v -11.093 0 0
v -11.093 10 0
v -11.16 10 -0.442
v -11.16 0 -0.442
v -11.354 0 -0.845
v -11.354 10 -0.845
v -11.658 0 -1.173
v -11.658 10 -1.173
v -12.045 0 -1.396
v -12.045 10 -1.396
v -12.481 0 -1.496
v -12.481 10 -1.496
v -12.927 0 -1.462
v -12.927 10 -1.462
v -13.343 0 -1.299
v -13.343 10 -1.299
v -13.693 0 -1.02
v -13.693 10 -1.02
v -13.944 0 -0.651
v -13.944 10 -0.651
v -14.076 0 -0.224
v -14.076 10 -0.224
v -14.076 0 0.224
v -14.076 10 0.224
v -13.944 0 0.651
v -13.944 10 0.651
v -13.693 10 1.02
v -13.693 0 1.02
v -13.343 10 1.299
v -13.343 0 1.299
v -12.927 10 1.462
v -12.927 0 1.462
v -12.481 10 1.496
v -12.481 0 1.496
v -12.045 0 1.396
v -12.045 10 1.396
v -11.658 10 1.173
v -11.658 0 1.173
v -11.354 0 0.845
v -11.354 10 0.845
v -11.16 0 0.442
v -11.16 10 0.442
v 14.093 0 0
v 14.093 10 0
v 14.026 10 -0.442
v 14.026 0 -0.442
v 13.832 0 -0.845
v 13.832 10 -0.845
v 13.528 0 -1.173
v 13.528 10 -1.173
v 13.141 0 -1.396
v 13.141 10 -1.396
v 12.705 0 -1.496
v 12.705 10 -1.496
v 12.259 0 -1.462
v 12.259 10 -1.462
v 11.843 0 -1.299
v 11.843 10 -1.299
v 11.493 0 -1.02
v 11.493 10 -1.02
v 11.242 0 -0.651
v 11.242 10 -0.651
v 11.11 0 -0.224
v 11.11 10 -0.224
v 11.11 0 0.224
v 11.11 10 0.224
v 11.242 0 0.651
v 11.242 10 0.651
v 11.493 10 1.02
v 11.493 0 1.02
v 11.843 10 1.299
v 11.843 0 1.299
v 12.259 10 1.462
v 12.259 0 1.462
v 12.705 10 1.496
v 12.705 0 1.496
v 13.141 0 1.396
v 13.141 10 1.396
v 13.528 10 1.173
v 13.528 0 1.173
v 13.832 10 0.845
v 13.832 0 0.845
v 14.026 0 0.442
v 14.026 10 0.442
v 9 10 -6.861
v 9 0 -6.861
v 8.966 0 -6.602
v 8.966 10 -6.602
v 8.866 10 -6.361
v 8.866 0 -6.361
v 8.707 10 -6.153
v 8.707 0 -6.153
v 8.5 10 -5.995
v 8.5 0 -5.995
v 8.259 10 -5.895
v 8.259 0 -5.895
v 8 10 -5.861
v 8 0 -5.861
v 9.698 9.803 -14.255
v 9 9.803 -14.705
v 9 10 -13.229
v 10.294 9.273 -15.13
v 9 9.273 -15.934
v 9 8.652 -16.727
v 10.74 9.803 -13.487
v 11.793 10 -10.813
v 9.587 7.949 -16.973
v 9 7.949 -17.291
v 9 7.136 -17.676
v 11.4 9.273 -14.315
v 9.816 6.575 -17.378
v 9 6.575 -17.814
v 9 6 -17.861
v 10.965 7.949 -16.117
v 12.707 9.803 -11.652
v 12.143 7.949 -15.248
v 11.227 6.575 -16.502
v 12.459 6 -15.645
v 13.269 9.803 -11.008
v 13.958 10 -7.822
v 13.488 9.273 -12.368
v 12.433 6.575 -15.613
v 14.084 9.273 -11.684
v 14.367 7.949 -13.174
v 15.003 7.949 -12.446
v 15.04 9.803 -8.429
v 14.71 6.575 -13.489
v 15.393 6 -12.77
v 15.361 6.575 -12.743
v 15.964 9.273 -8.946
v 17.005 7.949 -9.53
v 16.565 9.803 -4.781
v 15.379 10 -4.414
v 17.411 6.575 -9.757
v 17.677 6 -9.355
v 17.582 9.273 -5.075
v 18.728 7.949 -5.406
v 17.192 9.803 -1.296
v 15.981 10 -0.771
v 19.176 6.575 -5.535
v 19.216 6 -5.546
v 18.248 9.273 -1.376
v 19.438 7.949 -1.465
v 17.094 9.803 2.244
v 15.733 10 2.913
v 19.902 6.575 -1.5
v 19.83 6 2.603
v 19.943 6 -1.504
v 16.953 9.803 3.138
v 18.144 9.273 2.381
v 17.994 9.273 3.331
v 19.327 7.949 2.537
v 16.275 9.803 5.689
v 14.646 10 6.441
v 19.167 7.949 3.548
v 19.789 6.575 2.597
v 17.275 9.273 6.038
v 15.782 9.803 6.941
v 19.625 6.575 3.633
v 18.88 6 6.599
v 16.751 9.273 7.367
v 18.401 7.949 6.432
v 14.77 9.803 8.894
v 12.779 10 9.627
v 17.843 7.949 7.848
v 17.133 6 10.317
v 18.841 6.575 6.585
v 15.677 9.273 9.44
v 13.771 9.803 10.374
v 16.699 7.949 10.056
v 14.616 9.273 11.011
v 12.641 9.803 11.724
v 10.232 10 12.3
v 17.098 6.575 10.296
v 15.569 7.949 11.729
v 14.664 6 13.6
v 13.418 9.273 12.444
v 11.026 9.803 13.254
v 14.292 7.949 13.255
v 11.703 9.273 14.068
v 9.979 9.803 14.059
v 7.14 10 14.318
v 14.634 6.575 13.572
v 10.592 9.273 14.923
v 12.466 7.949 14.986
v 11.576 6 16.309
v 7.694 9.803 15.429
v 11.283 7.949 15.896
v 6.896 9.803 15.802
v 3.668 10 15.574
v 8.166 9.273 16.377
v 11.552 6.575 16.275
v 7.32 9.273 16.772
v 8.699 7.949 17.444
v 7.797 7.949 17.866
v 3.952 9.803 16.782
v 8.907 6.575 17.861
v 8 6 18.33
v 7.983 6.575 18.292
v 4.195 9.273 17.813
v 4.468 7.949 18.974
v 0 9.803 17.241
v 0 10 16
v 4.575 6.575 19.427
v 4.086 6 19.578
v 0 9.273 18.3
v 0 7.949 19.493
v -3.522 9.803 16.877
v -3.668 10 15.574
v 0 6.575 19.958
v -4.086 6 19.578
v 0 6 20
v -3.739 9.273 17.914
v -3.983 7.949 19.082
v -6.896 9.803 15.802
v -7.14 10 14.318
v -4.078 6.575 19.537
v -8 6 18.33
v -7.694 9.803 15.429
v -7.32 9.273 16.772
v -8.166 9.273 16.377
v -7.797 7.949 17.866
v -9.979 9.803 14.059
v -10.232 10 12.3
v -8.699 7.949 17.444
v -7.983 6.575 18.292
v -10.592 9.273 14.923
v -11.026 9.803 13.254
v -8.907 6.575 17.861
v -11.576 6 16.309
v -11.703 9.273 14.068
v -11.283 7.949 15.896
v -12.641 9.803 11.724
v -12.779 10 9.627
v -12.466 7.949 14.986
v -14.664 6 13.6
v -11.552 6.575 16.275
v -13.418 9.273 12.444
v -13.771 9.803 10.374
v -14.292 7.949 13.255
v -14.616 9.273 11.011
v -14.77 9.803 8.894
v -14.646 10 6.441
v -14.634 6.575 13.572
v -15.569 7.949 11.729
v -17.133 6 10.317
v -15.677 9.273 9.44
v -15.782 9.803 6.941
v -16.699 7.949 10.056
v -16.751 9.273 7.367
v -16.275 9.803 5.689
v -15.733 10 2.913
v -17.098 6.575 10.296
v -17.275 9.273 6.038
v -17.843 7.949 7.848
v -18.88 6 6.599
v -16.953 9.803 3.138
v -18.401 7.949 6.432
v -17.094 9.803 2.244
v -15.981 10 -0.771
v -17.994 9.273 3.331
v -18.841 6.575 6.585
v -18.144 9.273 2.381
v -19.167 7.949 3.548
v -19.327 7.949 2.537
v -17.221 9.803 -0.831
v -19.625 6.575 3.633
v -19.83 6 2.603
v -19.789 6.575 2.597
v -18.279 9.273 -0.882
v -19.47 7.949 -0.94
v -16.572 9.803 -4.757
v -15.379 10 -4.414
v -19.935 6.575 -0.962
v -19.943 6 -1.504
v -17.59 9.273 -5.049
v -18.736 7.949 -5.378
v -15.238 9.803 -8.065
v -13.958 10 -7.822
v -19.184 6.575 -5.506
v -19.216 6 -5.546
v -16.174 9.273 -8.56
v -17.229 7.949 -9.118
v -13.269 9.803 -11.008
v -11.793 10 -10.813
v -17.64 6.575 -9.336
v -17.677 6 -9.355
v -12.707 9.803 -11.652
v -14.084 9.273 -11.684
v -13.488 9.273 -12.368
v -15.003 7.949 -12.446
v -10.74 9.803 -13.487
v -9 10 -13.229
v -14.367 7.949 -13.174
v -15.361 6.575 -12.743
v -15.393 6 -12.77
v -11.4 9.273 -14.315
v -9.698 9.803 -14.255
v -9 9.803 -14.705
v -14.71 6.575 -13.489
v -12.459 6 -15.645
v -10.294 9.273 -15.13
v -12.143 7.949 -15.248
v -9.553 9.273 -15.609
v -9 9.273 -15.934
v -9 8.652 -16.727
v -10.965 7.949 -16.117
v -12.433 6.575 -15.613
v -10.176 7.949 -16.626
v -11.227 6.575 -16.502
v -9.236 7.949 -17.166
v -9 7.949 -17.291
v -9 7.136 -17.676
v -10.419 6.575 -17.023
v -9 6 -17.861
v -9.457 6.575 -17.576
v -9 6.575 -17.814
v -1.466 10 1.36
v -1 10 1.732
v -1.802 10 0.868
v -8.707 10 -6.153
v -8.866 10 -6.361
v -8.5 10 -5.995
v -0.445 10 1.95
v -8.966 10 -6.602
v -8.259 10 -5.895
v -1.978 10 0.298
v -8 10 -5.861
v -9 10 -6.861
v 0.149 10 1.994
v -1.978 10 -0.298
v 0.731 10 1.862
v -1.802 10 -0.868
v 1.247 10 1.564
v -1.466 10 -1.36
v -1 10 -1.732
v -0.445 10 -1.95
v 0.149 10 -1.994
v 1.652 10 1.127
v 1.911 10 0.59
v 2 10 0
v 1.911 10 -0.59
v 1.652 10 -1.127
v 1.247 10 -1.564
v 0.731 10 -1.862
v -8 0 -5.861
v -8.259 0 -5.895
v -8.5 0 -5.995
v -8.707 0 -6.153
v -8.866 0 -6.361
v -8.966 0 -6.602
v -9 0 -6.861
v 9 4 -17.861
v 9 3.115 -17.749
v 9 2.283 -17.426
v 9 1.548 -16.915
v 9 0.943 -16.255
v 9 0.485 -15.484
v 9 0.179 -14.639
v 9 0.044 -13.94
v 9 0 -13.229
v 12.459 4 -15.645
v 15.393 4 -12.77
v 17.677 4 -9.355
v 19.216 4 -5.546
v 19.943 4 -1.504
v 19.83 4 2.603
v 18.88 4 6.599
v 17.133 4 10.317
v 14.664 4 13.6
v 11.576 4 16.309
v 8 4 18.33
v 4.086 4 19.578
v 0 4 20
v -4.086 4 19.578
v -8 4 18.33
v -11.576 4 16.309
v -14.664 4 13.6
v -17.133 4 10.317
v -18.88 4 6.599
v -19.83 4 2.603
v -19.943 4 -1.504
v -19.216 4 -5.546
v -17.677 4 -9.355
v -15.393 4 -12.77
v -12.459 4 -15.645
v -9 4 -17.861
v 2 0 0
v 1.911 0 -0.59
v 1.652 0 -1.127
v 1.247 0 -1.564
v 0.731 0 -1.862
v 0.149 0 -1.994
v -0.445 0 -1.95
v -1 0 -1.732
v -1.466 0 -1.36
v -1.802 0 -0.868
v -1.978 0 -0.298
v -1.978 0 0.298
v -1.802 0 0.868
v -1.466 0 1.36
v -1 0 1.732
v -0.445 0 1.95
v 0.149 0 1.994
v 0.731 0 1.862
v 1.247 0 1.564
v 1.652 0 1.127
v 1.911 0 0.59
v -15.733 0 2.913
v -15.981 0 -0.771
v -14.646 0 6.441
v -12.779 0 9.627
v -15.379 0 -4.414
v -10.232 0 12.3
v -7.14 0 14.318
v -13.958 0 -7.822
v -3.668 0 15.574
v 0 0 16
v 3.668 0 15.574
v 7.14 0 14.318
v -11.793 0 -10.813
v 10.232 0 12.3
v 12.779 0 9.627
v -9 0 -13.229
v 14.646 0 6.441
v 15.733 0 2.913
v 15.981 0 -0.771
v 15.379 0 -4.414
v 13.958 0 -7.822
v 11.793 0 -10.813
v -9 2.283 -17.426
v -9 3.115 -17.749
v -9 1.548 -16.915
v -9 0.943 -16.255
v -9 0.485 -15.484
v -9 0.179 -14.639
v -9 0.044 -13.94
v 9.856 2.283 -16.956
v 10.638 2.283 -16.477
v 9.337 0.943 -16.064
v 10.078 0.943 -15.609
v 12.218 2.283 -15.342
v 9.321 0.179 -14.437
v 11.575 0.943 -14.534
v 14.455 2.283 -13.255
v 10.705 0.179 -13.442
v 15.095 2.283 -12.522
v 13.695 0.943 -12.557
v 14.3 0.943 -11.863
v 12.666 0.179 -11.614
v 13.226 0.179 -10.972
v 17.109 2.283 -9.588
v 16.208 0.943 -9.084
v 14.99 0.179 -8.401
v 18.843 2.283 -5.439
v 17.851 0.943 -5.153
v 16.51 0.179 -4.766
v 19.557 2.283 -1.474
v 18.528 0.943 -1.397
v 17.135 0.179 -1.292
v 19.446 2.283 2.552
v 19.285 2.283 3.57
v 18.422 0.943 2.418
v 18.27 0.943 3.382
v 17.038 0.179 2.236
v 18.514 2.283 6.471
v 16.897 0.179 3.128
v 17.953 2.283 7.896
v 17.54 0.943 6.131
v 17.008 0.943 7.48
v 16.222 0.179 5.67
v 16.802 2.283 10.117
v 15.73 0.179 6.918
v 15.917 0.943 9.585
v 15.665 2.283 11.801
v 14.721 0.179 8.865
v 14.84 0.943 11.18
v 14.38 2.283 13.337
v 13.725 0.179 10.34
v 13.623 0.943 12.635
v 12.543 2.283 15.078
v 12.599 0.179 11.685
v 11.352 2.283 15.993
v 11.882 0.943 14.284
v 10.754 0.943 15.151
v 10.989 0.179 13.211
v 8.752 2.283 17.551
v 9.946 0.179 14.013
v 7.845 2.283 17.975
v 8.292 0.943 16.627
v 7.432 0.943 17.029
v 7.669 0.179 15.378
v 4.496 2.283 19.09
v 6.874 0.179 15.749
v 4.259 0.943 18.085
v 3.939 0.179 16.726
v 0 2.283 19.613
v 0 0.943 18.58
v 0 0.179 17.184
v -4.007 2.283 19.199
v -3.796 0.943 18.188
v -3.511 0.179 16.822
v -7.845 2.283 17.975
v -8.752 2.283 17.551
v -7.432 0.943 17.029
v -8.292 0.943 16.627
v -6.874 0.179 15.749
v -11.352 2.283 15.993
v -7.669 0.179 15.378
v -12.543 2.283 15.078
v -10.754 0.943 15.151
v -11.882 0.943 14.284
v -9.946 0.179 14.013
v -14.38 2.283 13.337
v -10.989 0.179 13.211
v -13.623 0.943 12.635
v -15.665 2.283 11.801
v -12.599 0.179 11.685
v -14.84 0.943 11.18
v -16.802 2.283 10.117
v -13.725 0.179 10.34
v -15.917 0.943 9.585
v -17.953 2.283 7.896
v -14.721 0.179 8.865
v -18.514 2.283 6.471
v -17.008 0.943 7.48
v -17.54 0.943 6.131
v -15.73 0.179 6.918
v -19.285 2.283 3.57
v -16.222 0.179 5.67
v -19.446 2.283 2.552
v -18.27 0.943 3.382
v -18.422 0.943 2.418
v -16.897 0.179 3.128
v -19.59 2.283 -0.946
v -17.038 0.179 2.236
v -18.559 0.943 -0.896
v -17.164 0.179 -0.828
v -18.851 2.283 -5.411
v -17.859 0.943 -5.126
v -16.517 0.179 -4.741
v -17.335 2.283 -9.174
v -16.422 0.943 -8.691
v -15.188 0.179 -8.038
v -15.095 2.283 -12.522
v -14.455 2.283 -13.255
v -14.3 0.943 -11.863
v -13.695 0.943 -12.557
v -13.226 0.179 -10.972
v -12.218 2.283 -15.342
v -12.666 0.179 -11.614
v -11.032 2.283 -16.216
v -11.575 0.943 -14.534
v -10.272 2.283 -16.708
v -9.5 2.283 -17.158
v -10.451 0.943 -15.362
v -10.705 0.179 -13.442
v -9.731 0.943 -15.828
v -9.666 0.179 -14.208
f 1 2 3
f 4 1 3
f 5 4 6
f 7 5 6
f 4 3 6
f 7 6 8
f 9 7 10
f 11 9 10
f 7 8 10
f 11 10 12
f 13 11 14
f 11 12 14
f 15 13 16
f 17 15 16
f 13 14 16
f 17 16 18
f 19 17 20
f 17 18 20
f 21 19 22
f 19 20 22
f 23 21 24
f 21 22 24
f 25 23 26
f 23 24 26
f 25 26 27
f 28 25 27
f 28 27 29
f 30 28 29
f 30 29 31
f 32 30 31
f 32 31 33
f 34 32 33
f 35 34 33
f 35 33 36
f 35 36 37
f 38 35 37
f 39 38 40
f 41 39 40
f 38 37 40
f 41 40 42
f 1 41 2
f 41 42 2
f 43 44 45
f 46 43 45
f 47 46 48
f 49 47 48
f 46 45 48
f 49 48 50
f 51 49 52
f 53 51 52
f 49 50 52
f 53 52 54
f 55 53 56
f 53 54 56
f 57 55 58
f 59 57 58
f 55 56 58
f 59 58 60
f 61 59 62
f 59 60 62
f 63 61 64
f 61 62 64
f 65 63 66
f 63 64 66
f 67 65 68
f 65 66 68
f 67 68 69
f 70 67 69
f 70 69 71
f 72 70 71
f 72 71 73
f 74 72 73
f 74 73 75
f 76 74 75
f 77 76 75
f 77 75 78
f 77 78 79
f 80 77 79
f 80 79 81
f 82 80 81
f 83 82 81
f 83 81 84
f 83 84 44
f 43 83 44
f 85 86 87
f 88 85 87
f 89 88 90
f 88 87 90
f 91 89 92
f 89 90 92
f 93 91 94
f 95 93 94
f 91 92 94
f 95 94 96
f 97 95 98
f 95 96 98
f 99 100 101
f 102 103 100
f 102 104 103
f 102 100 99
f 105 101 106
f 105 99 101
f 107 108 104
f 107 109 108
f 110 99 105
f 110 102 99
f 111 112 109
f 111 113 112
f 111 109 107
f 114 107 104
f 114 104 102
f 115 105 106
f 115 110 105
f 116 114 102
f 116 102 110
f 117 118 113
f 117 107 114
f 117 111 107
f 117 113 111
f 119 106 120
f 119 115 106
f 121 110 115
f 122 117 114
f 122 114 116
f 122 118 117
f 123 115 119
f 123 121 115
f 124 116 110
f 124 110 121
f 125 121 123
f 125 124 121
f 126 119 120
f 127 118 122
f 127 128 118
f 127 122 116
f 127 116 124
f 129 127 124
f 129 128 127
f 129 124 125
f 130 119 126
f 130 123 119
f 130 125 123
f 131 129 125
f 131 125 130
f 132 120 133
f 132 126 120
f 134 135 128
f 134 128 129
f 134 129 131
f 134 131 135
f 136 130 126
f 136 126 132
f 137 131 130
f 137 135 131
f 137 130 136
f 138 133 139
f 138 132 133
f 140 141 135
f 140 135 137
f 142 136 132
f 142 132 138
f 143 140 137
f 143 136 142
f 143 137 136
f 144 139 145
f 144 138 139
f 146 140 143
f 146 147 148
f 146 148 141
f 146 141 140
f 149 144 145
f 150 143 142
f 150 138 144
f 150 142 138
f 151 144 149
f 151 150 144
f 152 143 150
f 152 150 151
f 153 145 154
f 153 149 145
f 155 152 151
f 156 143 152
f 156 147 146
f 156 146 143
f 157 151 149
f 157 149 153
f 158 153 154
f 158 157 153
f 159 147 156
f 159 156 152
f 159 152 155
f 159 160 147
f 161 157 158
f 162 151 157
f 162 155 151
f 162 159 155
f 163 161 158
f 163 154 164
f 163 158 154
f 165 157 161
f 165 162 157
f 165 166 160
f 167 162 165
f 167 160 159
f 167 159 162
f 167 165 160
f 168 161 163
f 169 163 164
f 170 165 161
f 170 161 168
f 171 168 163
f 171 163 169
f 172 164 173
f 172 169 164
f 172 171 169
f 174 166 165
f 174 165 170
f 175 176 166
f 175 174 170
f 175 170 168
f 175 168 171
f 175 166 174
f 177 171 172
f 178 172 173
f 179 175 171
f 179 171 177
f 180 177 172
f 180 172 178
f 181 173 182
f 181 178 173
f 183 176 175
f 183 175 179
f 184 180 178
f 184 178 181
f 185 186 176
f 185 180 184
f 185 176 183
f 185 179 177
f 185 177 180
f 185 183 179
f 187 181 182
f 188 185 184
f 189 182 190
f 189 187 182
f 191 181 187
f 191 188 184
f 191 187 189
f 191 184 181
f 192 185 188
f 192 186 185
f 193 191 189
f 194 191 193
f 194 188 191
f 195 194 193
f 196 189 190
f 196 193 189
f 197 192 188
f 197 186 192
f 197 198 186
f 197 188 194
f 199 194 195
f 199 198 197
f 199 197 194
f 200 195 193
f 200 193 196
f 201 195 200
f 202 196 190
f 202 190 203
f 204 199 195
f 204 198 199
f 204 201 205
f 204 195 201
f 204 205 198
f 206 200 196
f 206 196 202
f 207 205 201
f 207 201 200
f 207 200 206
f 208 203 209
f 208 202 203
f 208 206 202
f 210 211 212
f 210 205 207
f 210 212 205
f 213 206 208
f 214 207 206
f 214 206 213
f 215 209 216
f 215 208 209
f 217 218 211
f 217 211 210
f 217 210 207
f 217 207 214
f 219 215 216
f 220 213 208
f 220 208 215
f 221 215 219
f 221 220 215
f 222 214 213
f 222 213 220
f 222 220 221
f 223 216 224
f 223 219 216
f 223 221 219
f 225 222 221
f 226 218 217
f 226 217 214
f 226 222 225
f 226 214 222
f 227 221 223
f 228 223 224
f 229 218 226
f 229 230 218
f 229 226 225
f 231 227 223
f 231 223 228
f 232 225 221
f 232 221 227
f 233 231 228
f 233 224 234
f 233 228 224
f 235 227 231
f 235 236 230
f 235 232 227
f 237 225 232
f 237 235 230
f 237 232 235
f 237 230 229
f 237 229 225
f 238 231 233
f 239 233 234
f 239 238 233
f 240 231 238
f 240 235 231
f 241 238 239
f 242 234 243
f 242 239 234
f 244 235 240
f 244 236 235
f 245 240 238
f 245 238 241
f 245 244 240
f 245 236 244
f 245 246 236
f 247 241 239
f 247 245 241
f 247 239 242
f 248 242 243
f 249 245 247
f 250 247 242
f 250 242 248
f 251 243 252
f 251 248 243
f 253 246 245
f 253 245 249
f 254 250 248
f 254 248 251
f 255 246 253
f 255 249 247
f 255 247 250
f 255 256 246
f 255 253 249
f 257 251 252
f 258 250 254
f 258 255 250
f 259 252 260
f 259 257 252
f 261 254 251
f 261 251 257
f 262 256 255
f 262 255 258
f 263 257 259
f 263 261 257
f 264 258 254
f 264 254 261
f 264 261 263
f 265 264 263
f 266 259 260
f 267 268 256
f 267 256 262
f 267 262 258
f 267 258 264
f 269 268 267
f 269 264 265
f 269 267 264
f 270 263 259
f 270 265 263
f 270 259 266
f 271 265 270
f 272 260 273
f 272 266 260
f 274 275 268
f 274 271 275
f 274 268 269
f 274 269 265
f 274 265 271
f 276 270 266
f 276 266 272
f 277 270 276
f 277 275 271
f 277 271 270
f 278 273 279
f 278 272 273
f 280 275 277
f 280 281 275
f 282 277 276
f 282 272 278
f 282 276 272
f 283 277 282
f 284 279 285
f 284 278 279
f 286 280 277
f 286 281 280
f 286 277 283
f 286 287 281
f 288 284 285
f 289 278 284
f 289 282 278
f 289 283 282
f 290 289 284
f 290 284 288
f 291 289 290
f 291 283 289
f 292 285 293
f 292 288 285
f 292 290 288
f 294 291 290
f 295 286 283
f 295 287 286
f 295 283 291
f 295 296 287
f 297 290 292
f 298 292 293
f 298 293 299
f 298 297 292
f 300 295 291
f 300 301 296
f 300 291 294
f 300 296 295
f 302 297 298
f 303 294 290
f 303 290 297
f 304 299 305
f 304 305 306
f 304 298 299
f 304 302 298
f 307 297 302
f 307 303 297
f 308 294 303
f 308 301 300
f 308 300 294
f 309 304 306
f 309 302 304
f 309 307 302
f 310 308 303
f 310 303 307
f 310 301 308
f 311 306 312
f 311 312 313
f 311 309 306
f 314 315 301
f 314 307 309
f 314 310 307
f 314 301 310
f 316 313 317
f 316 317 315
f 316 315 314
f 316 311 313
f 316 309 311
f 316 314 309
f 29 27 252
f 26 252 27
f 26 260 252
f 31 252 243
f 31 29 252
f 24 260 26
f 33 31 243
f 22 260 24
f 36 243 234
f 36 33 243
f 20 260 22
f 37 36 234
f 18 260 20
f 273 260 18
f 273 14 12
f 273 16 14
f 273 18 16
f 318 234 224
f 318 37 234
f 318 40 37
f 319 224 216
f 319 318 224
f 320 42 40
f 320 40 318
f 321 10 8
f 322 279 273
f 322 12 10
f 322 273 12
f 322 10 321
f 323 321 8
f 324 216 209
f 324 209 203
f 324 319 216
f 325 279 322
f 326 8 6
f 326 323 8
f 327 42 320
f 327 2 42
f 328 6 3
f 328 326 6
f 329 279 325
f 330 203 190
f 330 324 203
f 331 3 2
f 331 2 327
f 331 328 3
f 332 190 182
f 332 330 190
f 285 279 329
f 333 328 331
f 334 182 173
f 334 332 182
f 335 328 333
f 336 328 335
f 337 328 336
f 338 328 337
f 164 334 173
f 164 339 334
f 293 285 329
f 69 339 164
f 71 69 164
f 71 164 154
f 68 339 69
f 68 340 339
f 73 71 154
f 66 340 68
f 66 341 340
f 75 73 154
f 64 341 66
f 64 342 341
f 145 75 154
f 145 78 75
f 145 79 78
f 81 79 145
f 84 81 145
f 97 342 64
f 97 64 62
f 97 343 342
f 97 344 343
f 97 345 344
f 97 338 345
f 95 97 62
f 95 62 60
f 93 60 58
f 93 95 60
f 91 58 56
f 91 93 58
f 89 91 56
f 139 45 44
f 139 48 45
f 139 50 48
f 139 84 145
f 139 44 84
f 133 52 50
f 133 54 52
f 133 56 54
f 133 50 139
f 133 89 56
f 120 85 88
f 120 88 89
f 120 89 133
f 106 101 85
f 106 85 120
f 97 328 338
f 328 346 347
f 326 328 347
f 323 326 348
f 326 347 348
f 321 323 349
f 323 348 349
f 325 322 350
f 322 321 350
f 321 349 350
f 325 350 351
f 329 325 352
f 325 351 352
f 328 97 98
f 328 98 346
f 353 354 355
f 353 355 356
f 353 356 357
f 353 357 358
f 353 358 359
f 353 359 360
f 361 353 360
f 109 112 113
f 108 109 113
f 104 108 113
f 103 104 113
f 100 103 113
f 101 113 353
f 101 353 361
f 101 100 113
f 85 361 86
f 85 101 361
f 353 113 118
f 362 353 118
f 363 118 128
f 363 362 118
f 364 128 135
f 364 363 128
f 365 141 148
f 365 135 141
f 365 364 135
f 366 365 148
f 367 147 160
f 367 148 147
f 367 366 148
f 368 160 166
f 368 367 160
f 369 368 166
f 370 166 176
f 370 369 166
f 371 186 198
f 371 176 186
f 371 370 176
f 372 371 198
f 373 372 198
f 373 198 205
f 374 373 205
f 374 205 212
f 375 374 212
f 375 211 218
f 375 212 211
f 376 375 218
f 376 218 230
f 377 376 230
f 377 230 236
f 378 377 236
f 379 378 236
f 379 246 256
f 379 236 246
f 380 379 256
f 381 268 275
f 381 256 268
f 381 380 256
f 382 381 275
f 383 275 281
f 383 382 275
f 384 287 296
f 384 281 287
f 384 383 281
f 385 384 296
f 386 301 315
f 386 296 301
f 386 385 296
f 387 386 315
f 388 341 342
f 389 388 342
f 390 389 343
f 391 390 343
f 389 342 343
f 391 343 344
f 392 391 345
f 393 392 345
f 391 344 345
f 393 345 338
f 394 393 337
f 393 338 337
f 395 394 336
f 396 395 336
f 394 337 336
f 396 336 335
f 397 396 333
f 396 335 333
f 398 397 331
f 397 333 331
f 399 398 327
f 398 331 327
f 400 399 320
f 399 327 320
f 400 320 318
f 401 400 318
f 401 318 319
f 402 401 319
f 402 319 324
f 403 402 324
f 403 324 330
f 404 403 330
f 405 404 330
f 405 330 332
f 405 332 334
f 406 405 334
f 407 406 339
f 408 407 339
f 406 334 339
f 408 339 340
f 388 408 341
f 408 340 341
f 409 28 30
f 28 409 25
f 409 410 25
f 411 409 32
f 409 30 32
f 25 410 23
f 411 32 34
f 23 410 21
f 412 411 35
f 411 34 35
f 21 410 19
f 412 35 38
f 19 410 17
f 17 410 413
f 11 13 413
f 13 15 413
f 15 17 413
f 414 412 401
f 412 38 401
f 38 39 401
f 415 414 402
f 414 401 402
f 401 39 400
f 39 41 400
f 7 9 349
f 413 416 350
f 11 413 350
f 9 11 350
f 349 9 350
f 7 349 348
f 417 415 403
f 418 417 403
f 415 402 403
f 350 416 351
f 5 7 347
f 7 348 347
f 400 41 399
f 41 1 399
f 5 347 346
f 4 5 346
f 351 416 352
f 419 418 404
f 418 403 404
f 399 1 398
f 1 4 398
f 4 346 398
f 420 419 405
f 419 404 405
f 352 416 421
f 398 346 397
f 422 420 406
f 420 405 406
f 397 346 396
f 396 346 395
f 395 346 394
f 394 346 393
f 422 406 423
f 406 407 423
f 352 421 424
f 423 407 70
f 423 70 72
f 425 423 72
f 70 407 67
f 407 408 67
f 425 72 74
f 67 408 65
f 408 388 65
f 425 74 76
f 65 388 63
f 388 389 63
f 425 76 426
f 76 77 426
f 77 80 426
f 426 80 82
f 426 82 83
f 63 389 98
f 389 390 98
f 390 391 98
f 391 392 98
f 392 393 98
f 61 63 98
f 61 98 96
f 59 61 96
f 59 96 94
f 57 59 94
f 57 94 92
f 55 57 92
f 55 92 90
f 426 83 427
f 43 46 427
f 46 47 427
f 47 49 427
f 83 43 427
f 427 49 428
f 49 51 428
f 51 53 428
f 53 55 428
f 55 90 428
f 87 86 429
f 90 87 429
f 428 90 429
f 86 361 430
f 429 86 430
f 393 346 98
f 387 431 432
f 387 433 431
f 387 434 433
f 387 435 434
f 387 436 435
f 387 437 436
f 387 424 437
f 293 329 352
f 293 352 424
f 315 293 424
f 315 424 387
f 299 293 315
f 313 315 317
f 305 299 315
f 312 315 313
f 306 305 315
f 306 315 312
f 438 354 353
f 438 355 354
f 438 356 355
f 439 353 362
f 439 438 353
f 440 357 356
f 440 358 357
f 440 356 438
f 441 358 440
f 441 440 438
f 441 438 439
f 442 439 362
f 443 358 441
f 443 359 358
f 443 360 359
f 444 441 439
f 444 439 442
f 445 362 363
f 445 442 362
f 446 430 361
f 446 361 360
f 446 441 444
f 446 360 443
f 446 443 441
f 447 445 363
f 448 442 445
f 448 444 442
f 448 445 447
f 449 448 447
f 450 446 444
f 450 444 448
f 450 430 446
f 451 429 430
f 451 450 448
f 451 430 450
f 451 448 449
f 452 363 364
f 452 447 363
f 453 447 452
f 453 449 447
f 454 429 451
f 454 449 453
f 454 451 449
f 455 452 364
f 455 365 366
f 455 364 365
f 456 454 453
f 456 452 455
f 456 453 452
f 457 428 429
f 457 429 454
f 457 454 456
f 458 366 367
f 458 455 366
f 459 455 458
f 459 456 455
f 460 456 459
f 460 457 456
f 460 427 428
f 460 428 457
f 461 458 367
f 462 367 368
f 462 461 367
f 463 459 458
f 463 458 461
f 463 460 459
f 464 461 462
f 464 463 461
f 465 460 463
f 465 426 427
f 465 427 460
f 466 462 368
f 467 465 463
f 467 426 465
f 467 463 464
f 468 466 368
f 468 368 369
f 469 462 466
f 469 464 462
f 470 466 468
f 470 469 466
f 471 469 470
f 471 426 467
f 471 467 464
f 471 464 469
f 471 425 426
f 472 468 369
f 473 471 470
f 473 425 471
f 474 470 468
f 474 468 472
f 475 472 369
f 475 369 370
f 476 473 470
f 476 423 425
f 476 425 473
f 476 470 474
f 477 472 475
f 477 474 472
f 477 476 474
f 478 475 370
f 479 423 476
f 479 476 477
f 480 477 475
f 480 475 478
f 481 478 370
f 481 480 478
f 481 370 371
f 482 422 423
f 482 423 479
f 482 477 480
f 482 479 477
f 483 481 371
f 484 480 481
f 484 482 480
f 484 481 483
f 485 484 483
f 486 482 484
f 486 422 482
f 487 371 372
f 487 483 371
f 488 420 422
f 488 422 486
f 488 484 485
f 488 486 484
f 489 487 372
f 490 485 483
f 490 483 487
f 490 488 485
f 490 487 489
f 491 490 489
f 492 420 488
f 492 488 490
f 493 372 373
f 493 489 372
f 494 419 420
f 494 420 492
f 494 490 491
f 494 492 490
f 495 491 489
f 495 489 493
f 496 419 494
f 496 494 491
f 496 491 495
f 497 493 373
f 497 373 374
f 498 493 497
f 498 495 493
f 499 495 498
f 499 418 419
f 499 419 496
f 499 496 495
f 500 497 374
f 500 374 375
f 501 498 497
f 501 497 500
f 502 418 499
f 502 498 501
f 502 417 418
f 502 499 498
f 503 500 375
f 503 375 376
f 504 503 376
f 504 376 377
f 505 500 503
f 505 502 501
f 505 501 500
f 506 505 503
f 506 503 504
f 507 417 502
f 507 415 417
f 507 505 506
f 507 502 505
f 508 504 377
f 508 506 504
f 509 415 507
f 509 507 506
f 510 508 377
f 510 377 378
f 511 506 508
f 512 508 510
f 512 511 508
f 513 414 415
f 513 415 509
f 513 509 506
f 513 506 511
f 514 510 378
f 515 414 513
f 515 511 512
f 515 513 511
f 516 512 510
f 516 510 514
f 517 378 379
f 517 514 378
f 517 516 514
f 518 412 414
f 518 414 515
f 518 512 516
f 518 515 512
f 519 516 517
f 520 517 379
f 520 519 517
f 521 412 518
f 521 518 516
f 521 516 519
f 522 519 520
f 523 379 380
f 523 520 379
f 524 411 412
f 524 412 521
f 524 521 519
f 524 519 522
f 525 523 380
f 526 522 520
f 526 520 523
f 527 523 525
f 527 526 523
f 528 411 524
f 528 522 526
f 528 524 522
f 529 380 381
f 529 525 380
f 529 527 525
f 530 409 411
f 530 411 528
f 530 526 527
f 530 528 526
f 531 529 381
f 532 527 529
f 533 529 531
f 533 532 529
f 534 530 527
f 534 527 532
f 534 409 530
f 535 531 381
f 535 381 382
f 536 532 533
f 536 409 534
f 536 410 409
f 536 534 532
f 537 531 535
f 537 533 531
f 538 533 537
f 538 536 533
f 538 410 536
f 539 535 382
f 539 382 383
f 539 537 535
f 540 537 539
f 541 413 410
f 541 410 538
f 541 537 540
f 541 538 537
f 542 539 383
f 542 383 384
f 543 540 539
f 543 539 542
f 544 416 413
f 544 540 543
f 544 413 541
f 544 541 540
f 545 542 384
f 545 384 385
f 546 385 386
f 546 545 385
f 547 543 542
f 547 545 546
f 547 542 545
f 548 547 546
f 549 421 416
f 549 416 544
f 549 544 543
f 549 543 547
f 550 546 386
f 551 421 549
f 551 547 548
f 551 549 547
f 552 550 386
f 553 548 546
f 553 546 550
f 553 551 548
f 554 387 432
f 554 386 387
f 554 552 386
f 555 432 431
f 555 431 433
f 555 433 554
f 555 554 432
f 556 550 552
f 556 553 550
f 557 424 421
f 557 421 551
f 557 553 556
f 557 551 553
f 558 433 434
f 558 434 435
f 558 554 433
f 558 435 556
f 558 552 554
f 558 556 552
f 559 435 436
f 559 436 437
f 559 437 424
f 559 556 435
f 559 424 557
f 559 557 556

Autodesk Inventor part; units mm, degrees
ref_plane "YZ Plane" through (0, 0, 0) normal (1, 0, 0) x (0, 1, 0)
ref_plane "XZ Plane" through (0, 0, 0) normal (0, 1, 0) x (-1, 0, 0)
ref_plane "XY Plane" through (0, 0, 0) normal (0, 0, 1) x (1, 0, 0)
sketch "Sketch1" plane through (0, 0, 0) normal (0, 1, 0) x (-1, 0, 0)
  circle A0 centre (0, 0) radius 20
  dimension "d0" = 40
extrude "Extrusion1" add sketch "Sketch1" along normal blind 10
sketch "Sketch2" plane through (0, 10, 0) normal (0, 1, 0) x (1, 0, 0)
  circle A0 centre (0, 0) radius 20 projected
  circle A1 centre (0, 0) radius 6
  dimension "d3" = 12
extrude "Extrusion2" cut sketch "Sketch2" against normal blind 10 contours A1
sketch "Sketch3" plane through (0, 10, 0) normal (0, 1, 0) x (1, 0, 0)
  circle A0 centre (-12.593, 0) radius 1.5
  circle A1 centre (12.593, 0) radius 1.5
  dimension "d7" = 3
  dimension "d8" = 3
extrude "Extrusion3" cut sketch "Sketch3" against normal blind 10
sketch "Sketch6" plane through (0, 10, 0) normal (0, 1, 0) x (1, 0, 0)
  circle A0 centre (0, 0) radius 6 projected
  circle A1 centre (0, 0) radius 20 projected
  circle A2 centre (0, 0) radius 5
  dimension "d11" = 10
extrude "Extrusion4" add sketch "Sketch6" against normal blind 10 contours A0
sketch "Sketch7" plane through (0, 10, 0) normal (0, 1, 0) x (1, 0, 0)
  circle A0 centre (0, 0) radius 5 projected
  circle A1 centre (0, 0) radius 20 projected
  circle A2 centre (0, 0) radius 3
  dimension "d14" = 6
extrude "Extrusion5" add sketch "Sketch7" against normal blind 2 contours A0
sketch "Sketch8" plane through (0, 10, 0) normal (0, 1, 0) x (1, 0, 0)
  circle A0 centre (0, 0) radius 20 projected
  line L0 (9, 17.8606) -> (9, 7.8606)
  line L1 (9, 7.8606) -> (-9, 7.8606)
  line L2 (-9, 7.8606) -> (-9, 17.8606)
  line L3 (-9, 17.8606) -> (9, 7.8606) construction
  line L4 (9, 17.8606) -> (-9, 7.8606) construction
  arc A1 (9, 17.8606) -> (-9, 17.8606) centre (0, 0) ccw
  point P0 (0, 12.8606)
  dimension "d17" = 18
  dimension "d18" = 10
extrude "Extrusion6" cut sketch "Sketch8" against normal blind 10 contours L0 L1 L2 A0 picked at (0, 11.9071)
sketch "Sketch9" plane through (0, 10, 0) normal (0, 1, 0) x (1, 0, 0)
  line L0 (-9, 7.8606) -> (9, 7.8606)
  line L1 (9, 7.8606) -> (9, 5.8606)
  line L2 (9, 5.8606) -> (-9, 5.8606)
  line L3 (-9, 5.8606) -> (-9, 7.8606)
  dimension "d21" = 18
  dimension "d25" = 2
extrude "Extrusion7" cut sketch "Sketch9" against normal blind 10
sketch "Sketch10" plane through (0, 0, 0) normal (0, -1, 0) x (1, 0, 0)
  circle A0 centre (0, 0) radius 5 projected
extrude "Extrusion8" add sketch "Sketch10" against normal blind 8
sketch "Sketch11" plane through (0, 8, 0) normal (0, 1, 0) x (1, 0, 0)
  circle A0 centre (0, 0) radius 3 projected
extrude "Extrusion9" cut sketch "Sketch11" against normal blind 8
sketch "Sketch12" plane through (0, 10, 0) normal (0, 1, 0) x (1, 0, 0)
  circle A0 centre (0, 0) radius 3 projected
  arc A1 (-9, 17.8606) -> (9, 17.8606) centre (0, 0) ccw projected
  circle A2 centre (0, 0) radius 2
  dimension "d32" = 4
extrude "Extrusion10" add sketch "Sketch12" against normal blind 10
fillet "Fillet1" radius 1 2 edges at (9, 5, -5.8606) (-9, 5, -5.8606)
fillet "Fillet2" radius 4 2 edges at (0, 0, 20) (0, 10, 20)
properties part number "ruka_lozisko"
